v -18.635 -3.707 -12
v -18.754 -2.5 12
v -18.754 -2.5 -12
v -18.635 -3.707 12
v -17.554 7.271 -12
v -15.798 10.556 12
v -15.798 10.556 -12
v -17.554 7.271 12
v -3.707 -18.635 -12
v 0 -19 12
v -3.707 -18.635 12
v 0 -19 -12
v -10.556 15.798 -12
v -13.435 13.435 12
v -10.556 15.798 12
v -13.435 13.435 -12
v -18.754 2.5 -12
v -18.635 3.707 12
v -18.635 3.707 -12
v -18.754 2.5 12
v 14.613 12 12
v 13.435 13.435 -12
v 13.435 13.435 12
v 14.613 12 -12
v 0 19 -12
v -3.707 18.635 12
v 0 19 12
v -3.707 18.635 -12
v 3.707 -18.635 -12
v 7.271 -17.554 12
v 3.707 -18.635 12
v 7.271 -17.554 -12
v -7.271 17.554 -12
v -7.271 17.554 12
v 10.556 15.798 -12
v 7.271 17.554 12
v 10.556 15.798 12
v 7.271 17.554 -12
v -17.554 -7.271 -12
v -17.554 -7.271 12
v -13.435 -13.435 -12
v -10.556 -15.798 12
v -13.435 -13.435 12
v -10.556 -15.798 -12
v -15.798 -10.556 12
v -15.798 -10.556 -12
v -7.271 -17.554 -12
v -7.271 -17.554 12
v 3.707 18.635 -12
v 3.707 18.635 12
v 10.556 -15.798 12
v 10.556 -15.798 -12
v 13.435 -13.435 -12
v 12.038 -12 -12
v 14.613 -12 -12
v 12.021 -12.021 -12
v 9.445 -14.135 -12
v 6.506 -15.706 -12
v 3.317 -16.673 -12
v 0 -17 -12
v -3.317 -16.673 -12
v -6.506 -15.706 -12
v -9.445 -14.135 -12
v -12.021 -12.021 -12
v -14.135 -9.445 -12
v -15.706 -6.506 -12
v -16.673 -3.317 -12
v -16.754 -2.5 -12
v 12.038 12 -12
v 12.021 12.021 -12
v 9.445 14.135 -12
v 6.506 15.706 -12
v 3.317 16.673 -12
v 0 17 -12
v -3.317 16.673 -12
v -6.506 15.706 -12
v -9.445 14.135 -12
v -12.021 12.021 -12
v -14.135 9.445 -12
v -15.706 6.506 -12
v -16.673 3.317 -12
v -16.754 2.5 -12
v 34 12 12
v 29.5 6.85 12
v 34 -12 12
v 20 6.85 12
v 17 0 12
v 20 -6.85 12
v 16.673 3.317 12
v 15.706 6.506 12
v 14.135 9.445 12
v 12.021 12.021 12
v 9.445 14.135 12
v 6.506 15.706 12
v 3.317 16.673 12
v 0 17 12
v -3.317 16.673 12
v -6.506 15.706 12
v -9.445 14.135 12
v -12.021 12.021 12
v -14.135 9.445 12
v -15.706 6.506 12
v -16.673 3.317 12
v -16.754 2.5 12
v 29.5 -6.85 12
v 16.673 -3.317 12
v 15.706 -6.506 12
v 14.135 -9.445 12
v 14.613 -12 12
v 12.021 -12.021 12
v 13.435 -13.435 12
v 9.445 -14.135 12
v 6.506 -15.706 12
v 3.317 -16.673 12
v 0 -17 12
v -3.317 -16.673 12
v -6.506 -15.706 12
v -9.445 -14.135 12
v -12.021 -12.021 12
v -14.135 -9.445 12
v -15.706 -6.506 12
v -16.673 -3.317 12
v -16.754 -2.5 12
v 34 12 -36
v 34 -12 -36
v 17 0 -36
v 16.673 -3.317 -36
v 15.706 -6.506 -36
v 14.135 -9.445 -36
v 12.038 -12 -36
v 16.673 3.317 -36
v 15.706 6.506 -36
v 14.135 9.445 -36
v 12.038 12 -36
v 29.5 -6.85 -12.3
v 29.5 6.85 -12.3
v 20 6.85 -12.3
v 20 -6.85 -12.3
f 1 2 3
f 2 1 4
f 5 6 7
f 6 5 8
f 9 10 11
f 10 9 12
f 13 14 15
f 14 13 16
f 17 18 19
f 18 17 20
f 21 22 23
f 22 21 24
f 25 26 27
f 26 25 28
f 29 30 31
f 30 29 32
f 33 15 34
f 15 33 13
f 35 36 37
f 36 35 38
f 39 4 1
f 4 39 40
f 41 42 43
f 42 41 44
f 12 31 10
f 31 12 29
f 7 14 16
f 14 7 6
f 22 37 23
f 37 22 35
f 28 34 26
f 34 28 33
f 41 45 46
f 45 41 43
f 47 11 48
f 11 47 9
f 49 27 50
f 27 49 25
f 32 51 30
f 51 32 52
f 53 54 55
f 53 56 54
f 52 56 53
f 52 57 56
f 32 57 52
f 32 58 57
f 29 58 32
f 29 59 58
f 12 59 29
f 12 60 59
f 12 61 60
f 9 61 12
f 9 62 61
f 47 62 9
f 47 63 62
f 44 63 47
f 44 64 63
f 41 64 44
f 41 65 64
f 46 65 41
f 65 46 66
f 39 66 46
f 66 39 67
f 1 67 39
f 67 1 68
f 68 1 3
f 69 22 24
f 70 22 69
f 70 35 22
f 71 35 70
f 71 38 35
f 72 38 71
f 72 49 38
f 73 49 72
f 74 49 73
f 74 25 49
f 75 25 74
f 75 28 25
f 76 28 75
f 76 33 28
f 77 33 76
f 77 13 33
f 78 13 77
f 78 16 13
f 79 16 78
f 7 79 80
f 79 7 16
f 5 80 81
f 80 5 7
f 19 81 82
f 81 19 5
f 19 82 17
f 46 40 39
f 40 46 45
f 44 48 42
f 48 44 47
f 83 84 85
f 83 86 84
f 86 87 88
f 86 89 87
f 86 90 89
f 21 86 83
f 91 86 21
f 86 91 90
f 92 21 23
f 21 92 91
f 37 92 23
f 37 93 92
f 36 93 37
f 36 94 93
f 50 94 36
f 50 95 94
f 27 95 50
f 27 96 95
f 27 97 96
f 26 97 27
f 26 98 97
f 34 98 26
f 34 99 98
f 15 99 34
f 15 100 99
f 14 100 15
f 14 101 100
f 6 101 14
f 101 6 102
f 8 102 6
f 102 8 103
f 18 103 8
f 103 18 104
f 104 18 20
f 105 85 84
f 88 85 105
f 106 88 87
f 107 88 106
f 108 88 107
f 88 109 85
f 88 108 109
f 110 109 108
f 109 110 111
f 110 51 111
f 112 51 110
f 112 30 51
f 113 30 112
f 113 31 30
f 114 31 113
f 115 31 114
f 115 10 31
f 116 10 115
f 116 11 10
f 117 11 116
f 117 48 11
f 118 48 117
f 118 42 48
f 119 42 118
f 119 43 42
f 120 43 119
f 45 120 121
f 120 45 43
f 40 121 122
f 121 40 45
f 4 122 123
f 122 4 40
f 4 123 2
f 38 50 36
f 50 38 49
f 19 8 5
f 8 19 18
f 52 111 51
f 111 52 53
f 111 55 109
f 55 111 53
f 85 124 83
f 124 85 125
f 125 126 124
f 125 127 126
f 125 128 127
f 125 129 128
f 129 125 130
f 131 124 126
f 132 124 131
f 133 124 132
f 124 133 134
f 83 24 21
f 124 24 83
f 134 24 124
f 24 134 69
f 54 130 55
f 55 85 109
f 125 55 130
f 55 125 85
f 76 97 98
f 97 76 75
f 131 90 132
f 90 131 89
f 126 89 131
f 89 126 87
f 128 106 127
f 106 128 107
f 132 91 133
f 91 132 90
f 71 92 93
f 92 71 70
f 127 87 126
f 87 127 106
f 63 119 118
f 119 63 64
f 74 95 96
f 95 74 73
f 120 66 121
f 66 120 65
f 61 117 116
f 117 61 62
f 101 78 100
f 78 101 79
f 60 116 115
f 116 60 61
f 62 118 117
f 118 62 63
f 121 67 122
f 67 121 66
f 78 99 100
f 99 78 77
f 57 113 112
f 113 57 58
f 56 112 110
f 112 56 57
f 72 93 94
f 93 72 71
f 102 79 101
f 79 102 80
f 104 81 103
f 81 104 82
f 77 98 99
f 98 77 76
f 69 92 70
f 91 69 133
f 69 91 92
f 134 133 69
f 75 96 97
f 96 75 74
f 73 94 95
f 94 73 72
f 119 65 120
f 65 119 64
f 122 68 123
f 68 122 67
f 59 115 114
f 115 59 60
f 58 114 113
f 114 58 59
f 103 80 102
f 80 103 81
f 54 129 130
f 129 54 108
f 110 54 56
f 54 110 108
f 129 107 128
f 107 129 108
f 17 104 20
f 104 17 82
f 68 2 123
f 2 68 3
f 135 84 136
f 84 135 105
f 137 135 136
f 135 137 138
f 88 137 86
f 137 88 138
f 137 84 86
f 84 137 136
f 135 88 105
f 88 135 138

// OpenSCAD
// ------------------------------------------------------------------------------------------
// MultiConnect holder for eSUN eVacuum Kit Pro Pump
// ------------------------------------------------------------------------------------------
//
// Simple wall holder for the vacuum pump that comes with the eSUN filament bags
// Designed to hold the pump upside down while it remains plugged in, and also includes a
// slot for the sealing clip
//
// https://esun3dstore.uk/products/evacuum-kit-pro
//
//
// Do not print from this SCAD, needs to be merged with the MultiConnect negative, see
// corresponding .3MF file, if you change any of the dimensions here, use 'replace STL' within
// OrcaSlicer
//
// This design is very dependent on the specific dimensions of the pump, if this changes,
// expect things to break, it's not truly parametric
//
// https://3dprinting.seeburn.co.uk/
// https://github.com/SiDtheTurtle/3DPrinting
//
// ------------------------------------------------------------------------------------------

// ------------------------------------------------------------------------------------------
// Parameters
// ------------------------------------------------------------------------------------------

// Define the physical diameter of the pump, where the clip will hold it
Pump_Diameter=34;

// Define the physical width of the sealer clip (SCAD Y dimension)
Sealer_Clip_Width=11.7;

// Define the pysical height of the sealer clip (SCAD Z dimension)
Sealer_Clip_Height=39;

// Define the physical depth of the sealer clip (SCAD X dimension)
Sealer_Clip_Depth=7.5;

// Define how thick you want the round bit of the holder to be, 2mm seems to work
Clip_Thickness=2;

// Define how far from the wall you want the holder to be
Holder_Depth=15;

/* [Hidden] */

// Cylinder facets
$fn=32;

// Main size multiplier - 24 is Multiboard less some wiggle room, if it fits Multiboard it'll fit OpenGrid, so no need to change it even if you're using OpenGrid
Grid_System=24; //[28:OpenGrid, 25:Multiboard]

// Parameters to define the overall size of the clip
Clip_D=Pump_Diameter+(Clip_Thickness*2);
Clip_Z=Grid_System;

// Parameters to define the cutout to hold the pump
Pump_D=Pump_Diameter;
Pump_Z=(Grid_System*2)+1;

// Parameters for the part that joins the clip to the board
Holder_X=(Clip_D/2)+Holder_Depth;
Holder_Y=Grid_System;;
Holder_Z=Clip_Z*2;

// Parameters for the clip cutout, allowing the cable to slide through
Cutout_X=Clip_Thickness+1;
Cutout_Y=5;
Cutout_Z=Clip_Z+1;

// Parameters for negative cutout to hold the sealer, take the actual size and add 2mm tolerance
Sealer_X = Sealer_Clip_Depth+2;
Sealer_Y = Sealer_Clip_Width+2;
Sealer_Z = Sealer_Clip_Height+2;

difference() {
    difference() {
        union(){
            // Outer clip
            cylinder(h=Clip_Z, d=Clip_D, center=true);
            // Holder
            translate([Holder_X/2, 0, Grid_System/-2]) {
                cube([Holder_X, Holder_Y, Holder_Z], center=true);
            }
        }
        // Inner clip negative
        translate([0, 0, Grid_System/-2]) {
            cylinder(h=Pump_Z, d=Pump_D, center=true);
        }
        
        // Clip cutout
        translate([(Clip_D-Clip_Thickness)/-2,0,0]) {
            cube([Cutout_X, Cutout_Y, Cutout_Z], center=true);
        }
    }
    // Sealer clip negative
    // ### Hack, got bored trying to figure out the position
    translate([((Clip_D+Sealer_X)/2)+1, 0, Sealer_Z/5]) {
        cube([Sealer_X, Sealer_Y, Sealer_Z], center=true);
    }
}
